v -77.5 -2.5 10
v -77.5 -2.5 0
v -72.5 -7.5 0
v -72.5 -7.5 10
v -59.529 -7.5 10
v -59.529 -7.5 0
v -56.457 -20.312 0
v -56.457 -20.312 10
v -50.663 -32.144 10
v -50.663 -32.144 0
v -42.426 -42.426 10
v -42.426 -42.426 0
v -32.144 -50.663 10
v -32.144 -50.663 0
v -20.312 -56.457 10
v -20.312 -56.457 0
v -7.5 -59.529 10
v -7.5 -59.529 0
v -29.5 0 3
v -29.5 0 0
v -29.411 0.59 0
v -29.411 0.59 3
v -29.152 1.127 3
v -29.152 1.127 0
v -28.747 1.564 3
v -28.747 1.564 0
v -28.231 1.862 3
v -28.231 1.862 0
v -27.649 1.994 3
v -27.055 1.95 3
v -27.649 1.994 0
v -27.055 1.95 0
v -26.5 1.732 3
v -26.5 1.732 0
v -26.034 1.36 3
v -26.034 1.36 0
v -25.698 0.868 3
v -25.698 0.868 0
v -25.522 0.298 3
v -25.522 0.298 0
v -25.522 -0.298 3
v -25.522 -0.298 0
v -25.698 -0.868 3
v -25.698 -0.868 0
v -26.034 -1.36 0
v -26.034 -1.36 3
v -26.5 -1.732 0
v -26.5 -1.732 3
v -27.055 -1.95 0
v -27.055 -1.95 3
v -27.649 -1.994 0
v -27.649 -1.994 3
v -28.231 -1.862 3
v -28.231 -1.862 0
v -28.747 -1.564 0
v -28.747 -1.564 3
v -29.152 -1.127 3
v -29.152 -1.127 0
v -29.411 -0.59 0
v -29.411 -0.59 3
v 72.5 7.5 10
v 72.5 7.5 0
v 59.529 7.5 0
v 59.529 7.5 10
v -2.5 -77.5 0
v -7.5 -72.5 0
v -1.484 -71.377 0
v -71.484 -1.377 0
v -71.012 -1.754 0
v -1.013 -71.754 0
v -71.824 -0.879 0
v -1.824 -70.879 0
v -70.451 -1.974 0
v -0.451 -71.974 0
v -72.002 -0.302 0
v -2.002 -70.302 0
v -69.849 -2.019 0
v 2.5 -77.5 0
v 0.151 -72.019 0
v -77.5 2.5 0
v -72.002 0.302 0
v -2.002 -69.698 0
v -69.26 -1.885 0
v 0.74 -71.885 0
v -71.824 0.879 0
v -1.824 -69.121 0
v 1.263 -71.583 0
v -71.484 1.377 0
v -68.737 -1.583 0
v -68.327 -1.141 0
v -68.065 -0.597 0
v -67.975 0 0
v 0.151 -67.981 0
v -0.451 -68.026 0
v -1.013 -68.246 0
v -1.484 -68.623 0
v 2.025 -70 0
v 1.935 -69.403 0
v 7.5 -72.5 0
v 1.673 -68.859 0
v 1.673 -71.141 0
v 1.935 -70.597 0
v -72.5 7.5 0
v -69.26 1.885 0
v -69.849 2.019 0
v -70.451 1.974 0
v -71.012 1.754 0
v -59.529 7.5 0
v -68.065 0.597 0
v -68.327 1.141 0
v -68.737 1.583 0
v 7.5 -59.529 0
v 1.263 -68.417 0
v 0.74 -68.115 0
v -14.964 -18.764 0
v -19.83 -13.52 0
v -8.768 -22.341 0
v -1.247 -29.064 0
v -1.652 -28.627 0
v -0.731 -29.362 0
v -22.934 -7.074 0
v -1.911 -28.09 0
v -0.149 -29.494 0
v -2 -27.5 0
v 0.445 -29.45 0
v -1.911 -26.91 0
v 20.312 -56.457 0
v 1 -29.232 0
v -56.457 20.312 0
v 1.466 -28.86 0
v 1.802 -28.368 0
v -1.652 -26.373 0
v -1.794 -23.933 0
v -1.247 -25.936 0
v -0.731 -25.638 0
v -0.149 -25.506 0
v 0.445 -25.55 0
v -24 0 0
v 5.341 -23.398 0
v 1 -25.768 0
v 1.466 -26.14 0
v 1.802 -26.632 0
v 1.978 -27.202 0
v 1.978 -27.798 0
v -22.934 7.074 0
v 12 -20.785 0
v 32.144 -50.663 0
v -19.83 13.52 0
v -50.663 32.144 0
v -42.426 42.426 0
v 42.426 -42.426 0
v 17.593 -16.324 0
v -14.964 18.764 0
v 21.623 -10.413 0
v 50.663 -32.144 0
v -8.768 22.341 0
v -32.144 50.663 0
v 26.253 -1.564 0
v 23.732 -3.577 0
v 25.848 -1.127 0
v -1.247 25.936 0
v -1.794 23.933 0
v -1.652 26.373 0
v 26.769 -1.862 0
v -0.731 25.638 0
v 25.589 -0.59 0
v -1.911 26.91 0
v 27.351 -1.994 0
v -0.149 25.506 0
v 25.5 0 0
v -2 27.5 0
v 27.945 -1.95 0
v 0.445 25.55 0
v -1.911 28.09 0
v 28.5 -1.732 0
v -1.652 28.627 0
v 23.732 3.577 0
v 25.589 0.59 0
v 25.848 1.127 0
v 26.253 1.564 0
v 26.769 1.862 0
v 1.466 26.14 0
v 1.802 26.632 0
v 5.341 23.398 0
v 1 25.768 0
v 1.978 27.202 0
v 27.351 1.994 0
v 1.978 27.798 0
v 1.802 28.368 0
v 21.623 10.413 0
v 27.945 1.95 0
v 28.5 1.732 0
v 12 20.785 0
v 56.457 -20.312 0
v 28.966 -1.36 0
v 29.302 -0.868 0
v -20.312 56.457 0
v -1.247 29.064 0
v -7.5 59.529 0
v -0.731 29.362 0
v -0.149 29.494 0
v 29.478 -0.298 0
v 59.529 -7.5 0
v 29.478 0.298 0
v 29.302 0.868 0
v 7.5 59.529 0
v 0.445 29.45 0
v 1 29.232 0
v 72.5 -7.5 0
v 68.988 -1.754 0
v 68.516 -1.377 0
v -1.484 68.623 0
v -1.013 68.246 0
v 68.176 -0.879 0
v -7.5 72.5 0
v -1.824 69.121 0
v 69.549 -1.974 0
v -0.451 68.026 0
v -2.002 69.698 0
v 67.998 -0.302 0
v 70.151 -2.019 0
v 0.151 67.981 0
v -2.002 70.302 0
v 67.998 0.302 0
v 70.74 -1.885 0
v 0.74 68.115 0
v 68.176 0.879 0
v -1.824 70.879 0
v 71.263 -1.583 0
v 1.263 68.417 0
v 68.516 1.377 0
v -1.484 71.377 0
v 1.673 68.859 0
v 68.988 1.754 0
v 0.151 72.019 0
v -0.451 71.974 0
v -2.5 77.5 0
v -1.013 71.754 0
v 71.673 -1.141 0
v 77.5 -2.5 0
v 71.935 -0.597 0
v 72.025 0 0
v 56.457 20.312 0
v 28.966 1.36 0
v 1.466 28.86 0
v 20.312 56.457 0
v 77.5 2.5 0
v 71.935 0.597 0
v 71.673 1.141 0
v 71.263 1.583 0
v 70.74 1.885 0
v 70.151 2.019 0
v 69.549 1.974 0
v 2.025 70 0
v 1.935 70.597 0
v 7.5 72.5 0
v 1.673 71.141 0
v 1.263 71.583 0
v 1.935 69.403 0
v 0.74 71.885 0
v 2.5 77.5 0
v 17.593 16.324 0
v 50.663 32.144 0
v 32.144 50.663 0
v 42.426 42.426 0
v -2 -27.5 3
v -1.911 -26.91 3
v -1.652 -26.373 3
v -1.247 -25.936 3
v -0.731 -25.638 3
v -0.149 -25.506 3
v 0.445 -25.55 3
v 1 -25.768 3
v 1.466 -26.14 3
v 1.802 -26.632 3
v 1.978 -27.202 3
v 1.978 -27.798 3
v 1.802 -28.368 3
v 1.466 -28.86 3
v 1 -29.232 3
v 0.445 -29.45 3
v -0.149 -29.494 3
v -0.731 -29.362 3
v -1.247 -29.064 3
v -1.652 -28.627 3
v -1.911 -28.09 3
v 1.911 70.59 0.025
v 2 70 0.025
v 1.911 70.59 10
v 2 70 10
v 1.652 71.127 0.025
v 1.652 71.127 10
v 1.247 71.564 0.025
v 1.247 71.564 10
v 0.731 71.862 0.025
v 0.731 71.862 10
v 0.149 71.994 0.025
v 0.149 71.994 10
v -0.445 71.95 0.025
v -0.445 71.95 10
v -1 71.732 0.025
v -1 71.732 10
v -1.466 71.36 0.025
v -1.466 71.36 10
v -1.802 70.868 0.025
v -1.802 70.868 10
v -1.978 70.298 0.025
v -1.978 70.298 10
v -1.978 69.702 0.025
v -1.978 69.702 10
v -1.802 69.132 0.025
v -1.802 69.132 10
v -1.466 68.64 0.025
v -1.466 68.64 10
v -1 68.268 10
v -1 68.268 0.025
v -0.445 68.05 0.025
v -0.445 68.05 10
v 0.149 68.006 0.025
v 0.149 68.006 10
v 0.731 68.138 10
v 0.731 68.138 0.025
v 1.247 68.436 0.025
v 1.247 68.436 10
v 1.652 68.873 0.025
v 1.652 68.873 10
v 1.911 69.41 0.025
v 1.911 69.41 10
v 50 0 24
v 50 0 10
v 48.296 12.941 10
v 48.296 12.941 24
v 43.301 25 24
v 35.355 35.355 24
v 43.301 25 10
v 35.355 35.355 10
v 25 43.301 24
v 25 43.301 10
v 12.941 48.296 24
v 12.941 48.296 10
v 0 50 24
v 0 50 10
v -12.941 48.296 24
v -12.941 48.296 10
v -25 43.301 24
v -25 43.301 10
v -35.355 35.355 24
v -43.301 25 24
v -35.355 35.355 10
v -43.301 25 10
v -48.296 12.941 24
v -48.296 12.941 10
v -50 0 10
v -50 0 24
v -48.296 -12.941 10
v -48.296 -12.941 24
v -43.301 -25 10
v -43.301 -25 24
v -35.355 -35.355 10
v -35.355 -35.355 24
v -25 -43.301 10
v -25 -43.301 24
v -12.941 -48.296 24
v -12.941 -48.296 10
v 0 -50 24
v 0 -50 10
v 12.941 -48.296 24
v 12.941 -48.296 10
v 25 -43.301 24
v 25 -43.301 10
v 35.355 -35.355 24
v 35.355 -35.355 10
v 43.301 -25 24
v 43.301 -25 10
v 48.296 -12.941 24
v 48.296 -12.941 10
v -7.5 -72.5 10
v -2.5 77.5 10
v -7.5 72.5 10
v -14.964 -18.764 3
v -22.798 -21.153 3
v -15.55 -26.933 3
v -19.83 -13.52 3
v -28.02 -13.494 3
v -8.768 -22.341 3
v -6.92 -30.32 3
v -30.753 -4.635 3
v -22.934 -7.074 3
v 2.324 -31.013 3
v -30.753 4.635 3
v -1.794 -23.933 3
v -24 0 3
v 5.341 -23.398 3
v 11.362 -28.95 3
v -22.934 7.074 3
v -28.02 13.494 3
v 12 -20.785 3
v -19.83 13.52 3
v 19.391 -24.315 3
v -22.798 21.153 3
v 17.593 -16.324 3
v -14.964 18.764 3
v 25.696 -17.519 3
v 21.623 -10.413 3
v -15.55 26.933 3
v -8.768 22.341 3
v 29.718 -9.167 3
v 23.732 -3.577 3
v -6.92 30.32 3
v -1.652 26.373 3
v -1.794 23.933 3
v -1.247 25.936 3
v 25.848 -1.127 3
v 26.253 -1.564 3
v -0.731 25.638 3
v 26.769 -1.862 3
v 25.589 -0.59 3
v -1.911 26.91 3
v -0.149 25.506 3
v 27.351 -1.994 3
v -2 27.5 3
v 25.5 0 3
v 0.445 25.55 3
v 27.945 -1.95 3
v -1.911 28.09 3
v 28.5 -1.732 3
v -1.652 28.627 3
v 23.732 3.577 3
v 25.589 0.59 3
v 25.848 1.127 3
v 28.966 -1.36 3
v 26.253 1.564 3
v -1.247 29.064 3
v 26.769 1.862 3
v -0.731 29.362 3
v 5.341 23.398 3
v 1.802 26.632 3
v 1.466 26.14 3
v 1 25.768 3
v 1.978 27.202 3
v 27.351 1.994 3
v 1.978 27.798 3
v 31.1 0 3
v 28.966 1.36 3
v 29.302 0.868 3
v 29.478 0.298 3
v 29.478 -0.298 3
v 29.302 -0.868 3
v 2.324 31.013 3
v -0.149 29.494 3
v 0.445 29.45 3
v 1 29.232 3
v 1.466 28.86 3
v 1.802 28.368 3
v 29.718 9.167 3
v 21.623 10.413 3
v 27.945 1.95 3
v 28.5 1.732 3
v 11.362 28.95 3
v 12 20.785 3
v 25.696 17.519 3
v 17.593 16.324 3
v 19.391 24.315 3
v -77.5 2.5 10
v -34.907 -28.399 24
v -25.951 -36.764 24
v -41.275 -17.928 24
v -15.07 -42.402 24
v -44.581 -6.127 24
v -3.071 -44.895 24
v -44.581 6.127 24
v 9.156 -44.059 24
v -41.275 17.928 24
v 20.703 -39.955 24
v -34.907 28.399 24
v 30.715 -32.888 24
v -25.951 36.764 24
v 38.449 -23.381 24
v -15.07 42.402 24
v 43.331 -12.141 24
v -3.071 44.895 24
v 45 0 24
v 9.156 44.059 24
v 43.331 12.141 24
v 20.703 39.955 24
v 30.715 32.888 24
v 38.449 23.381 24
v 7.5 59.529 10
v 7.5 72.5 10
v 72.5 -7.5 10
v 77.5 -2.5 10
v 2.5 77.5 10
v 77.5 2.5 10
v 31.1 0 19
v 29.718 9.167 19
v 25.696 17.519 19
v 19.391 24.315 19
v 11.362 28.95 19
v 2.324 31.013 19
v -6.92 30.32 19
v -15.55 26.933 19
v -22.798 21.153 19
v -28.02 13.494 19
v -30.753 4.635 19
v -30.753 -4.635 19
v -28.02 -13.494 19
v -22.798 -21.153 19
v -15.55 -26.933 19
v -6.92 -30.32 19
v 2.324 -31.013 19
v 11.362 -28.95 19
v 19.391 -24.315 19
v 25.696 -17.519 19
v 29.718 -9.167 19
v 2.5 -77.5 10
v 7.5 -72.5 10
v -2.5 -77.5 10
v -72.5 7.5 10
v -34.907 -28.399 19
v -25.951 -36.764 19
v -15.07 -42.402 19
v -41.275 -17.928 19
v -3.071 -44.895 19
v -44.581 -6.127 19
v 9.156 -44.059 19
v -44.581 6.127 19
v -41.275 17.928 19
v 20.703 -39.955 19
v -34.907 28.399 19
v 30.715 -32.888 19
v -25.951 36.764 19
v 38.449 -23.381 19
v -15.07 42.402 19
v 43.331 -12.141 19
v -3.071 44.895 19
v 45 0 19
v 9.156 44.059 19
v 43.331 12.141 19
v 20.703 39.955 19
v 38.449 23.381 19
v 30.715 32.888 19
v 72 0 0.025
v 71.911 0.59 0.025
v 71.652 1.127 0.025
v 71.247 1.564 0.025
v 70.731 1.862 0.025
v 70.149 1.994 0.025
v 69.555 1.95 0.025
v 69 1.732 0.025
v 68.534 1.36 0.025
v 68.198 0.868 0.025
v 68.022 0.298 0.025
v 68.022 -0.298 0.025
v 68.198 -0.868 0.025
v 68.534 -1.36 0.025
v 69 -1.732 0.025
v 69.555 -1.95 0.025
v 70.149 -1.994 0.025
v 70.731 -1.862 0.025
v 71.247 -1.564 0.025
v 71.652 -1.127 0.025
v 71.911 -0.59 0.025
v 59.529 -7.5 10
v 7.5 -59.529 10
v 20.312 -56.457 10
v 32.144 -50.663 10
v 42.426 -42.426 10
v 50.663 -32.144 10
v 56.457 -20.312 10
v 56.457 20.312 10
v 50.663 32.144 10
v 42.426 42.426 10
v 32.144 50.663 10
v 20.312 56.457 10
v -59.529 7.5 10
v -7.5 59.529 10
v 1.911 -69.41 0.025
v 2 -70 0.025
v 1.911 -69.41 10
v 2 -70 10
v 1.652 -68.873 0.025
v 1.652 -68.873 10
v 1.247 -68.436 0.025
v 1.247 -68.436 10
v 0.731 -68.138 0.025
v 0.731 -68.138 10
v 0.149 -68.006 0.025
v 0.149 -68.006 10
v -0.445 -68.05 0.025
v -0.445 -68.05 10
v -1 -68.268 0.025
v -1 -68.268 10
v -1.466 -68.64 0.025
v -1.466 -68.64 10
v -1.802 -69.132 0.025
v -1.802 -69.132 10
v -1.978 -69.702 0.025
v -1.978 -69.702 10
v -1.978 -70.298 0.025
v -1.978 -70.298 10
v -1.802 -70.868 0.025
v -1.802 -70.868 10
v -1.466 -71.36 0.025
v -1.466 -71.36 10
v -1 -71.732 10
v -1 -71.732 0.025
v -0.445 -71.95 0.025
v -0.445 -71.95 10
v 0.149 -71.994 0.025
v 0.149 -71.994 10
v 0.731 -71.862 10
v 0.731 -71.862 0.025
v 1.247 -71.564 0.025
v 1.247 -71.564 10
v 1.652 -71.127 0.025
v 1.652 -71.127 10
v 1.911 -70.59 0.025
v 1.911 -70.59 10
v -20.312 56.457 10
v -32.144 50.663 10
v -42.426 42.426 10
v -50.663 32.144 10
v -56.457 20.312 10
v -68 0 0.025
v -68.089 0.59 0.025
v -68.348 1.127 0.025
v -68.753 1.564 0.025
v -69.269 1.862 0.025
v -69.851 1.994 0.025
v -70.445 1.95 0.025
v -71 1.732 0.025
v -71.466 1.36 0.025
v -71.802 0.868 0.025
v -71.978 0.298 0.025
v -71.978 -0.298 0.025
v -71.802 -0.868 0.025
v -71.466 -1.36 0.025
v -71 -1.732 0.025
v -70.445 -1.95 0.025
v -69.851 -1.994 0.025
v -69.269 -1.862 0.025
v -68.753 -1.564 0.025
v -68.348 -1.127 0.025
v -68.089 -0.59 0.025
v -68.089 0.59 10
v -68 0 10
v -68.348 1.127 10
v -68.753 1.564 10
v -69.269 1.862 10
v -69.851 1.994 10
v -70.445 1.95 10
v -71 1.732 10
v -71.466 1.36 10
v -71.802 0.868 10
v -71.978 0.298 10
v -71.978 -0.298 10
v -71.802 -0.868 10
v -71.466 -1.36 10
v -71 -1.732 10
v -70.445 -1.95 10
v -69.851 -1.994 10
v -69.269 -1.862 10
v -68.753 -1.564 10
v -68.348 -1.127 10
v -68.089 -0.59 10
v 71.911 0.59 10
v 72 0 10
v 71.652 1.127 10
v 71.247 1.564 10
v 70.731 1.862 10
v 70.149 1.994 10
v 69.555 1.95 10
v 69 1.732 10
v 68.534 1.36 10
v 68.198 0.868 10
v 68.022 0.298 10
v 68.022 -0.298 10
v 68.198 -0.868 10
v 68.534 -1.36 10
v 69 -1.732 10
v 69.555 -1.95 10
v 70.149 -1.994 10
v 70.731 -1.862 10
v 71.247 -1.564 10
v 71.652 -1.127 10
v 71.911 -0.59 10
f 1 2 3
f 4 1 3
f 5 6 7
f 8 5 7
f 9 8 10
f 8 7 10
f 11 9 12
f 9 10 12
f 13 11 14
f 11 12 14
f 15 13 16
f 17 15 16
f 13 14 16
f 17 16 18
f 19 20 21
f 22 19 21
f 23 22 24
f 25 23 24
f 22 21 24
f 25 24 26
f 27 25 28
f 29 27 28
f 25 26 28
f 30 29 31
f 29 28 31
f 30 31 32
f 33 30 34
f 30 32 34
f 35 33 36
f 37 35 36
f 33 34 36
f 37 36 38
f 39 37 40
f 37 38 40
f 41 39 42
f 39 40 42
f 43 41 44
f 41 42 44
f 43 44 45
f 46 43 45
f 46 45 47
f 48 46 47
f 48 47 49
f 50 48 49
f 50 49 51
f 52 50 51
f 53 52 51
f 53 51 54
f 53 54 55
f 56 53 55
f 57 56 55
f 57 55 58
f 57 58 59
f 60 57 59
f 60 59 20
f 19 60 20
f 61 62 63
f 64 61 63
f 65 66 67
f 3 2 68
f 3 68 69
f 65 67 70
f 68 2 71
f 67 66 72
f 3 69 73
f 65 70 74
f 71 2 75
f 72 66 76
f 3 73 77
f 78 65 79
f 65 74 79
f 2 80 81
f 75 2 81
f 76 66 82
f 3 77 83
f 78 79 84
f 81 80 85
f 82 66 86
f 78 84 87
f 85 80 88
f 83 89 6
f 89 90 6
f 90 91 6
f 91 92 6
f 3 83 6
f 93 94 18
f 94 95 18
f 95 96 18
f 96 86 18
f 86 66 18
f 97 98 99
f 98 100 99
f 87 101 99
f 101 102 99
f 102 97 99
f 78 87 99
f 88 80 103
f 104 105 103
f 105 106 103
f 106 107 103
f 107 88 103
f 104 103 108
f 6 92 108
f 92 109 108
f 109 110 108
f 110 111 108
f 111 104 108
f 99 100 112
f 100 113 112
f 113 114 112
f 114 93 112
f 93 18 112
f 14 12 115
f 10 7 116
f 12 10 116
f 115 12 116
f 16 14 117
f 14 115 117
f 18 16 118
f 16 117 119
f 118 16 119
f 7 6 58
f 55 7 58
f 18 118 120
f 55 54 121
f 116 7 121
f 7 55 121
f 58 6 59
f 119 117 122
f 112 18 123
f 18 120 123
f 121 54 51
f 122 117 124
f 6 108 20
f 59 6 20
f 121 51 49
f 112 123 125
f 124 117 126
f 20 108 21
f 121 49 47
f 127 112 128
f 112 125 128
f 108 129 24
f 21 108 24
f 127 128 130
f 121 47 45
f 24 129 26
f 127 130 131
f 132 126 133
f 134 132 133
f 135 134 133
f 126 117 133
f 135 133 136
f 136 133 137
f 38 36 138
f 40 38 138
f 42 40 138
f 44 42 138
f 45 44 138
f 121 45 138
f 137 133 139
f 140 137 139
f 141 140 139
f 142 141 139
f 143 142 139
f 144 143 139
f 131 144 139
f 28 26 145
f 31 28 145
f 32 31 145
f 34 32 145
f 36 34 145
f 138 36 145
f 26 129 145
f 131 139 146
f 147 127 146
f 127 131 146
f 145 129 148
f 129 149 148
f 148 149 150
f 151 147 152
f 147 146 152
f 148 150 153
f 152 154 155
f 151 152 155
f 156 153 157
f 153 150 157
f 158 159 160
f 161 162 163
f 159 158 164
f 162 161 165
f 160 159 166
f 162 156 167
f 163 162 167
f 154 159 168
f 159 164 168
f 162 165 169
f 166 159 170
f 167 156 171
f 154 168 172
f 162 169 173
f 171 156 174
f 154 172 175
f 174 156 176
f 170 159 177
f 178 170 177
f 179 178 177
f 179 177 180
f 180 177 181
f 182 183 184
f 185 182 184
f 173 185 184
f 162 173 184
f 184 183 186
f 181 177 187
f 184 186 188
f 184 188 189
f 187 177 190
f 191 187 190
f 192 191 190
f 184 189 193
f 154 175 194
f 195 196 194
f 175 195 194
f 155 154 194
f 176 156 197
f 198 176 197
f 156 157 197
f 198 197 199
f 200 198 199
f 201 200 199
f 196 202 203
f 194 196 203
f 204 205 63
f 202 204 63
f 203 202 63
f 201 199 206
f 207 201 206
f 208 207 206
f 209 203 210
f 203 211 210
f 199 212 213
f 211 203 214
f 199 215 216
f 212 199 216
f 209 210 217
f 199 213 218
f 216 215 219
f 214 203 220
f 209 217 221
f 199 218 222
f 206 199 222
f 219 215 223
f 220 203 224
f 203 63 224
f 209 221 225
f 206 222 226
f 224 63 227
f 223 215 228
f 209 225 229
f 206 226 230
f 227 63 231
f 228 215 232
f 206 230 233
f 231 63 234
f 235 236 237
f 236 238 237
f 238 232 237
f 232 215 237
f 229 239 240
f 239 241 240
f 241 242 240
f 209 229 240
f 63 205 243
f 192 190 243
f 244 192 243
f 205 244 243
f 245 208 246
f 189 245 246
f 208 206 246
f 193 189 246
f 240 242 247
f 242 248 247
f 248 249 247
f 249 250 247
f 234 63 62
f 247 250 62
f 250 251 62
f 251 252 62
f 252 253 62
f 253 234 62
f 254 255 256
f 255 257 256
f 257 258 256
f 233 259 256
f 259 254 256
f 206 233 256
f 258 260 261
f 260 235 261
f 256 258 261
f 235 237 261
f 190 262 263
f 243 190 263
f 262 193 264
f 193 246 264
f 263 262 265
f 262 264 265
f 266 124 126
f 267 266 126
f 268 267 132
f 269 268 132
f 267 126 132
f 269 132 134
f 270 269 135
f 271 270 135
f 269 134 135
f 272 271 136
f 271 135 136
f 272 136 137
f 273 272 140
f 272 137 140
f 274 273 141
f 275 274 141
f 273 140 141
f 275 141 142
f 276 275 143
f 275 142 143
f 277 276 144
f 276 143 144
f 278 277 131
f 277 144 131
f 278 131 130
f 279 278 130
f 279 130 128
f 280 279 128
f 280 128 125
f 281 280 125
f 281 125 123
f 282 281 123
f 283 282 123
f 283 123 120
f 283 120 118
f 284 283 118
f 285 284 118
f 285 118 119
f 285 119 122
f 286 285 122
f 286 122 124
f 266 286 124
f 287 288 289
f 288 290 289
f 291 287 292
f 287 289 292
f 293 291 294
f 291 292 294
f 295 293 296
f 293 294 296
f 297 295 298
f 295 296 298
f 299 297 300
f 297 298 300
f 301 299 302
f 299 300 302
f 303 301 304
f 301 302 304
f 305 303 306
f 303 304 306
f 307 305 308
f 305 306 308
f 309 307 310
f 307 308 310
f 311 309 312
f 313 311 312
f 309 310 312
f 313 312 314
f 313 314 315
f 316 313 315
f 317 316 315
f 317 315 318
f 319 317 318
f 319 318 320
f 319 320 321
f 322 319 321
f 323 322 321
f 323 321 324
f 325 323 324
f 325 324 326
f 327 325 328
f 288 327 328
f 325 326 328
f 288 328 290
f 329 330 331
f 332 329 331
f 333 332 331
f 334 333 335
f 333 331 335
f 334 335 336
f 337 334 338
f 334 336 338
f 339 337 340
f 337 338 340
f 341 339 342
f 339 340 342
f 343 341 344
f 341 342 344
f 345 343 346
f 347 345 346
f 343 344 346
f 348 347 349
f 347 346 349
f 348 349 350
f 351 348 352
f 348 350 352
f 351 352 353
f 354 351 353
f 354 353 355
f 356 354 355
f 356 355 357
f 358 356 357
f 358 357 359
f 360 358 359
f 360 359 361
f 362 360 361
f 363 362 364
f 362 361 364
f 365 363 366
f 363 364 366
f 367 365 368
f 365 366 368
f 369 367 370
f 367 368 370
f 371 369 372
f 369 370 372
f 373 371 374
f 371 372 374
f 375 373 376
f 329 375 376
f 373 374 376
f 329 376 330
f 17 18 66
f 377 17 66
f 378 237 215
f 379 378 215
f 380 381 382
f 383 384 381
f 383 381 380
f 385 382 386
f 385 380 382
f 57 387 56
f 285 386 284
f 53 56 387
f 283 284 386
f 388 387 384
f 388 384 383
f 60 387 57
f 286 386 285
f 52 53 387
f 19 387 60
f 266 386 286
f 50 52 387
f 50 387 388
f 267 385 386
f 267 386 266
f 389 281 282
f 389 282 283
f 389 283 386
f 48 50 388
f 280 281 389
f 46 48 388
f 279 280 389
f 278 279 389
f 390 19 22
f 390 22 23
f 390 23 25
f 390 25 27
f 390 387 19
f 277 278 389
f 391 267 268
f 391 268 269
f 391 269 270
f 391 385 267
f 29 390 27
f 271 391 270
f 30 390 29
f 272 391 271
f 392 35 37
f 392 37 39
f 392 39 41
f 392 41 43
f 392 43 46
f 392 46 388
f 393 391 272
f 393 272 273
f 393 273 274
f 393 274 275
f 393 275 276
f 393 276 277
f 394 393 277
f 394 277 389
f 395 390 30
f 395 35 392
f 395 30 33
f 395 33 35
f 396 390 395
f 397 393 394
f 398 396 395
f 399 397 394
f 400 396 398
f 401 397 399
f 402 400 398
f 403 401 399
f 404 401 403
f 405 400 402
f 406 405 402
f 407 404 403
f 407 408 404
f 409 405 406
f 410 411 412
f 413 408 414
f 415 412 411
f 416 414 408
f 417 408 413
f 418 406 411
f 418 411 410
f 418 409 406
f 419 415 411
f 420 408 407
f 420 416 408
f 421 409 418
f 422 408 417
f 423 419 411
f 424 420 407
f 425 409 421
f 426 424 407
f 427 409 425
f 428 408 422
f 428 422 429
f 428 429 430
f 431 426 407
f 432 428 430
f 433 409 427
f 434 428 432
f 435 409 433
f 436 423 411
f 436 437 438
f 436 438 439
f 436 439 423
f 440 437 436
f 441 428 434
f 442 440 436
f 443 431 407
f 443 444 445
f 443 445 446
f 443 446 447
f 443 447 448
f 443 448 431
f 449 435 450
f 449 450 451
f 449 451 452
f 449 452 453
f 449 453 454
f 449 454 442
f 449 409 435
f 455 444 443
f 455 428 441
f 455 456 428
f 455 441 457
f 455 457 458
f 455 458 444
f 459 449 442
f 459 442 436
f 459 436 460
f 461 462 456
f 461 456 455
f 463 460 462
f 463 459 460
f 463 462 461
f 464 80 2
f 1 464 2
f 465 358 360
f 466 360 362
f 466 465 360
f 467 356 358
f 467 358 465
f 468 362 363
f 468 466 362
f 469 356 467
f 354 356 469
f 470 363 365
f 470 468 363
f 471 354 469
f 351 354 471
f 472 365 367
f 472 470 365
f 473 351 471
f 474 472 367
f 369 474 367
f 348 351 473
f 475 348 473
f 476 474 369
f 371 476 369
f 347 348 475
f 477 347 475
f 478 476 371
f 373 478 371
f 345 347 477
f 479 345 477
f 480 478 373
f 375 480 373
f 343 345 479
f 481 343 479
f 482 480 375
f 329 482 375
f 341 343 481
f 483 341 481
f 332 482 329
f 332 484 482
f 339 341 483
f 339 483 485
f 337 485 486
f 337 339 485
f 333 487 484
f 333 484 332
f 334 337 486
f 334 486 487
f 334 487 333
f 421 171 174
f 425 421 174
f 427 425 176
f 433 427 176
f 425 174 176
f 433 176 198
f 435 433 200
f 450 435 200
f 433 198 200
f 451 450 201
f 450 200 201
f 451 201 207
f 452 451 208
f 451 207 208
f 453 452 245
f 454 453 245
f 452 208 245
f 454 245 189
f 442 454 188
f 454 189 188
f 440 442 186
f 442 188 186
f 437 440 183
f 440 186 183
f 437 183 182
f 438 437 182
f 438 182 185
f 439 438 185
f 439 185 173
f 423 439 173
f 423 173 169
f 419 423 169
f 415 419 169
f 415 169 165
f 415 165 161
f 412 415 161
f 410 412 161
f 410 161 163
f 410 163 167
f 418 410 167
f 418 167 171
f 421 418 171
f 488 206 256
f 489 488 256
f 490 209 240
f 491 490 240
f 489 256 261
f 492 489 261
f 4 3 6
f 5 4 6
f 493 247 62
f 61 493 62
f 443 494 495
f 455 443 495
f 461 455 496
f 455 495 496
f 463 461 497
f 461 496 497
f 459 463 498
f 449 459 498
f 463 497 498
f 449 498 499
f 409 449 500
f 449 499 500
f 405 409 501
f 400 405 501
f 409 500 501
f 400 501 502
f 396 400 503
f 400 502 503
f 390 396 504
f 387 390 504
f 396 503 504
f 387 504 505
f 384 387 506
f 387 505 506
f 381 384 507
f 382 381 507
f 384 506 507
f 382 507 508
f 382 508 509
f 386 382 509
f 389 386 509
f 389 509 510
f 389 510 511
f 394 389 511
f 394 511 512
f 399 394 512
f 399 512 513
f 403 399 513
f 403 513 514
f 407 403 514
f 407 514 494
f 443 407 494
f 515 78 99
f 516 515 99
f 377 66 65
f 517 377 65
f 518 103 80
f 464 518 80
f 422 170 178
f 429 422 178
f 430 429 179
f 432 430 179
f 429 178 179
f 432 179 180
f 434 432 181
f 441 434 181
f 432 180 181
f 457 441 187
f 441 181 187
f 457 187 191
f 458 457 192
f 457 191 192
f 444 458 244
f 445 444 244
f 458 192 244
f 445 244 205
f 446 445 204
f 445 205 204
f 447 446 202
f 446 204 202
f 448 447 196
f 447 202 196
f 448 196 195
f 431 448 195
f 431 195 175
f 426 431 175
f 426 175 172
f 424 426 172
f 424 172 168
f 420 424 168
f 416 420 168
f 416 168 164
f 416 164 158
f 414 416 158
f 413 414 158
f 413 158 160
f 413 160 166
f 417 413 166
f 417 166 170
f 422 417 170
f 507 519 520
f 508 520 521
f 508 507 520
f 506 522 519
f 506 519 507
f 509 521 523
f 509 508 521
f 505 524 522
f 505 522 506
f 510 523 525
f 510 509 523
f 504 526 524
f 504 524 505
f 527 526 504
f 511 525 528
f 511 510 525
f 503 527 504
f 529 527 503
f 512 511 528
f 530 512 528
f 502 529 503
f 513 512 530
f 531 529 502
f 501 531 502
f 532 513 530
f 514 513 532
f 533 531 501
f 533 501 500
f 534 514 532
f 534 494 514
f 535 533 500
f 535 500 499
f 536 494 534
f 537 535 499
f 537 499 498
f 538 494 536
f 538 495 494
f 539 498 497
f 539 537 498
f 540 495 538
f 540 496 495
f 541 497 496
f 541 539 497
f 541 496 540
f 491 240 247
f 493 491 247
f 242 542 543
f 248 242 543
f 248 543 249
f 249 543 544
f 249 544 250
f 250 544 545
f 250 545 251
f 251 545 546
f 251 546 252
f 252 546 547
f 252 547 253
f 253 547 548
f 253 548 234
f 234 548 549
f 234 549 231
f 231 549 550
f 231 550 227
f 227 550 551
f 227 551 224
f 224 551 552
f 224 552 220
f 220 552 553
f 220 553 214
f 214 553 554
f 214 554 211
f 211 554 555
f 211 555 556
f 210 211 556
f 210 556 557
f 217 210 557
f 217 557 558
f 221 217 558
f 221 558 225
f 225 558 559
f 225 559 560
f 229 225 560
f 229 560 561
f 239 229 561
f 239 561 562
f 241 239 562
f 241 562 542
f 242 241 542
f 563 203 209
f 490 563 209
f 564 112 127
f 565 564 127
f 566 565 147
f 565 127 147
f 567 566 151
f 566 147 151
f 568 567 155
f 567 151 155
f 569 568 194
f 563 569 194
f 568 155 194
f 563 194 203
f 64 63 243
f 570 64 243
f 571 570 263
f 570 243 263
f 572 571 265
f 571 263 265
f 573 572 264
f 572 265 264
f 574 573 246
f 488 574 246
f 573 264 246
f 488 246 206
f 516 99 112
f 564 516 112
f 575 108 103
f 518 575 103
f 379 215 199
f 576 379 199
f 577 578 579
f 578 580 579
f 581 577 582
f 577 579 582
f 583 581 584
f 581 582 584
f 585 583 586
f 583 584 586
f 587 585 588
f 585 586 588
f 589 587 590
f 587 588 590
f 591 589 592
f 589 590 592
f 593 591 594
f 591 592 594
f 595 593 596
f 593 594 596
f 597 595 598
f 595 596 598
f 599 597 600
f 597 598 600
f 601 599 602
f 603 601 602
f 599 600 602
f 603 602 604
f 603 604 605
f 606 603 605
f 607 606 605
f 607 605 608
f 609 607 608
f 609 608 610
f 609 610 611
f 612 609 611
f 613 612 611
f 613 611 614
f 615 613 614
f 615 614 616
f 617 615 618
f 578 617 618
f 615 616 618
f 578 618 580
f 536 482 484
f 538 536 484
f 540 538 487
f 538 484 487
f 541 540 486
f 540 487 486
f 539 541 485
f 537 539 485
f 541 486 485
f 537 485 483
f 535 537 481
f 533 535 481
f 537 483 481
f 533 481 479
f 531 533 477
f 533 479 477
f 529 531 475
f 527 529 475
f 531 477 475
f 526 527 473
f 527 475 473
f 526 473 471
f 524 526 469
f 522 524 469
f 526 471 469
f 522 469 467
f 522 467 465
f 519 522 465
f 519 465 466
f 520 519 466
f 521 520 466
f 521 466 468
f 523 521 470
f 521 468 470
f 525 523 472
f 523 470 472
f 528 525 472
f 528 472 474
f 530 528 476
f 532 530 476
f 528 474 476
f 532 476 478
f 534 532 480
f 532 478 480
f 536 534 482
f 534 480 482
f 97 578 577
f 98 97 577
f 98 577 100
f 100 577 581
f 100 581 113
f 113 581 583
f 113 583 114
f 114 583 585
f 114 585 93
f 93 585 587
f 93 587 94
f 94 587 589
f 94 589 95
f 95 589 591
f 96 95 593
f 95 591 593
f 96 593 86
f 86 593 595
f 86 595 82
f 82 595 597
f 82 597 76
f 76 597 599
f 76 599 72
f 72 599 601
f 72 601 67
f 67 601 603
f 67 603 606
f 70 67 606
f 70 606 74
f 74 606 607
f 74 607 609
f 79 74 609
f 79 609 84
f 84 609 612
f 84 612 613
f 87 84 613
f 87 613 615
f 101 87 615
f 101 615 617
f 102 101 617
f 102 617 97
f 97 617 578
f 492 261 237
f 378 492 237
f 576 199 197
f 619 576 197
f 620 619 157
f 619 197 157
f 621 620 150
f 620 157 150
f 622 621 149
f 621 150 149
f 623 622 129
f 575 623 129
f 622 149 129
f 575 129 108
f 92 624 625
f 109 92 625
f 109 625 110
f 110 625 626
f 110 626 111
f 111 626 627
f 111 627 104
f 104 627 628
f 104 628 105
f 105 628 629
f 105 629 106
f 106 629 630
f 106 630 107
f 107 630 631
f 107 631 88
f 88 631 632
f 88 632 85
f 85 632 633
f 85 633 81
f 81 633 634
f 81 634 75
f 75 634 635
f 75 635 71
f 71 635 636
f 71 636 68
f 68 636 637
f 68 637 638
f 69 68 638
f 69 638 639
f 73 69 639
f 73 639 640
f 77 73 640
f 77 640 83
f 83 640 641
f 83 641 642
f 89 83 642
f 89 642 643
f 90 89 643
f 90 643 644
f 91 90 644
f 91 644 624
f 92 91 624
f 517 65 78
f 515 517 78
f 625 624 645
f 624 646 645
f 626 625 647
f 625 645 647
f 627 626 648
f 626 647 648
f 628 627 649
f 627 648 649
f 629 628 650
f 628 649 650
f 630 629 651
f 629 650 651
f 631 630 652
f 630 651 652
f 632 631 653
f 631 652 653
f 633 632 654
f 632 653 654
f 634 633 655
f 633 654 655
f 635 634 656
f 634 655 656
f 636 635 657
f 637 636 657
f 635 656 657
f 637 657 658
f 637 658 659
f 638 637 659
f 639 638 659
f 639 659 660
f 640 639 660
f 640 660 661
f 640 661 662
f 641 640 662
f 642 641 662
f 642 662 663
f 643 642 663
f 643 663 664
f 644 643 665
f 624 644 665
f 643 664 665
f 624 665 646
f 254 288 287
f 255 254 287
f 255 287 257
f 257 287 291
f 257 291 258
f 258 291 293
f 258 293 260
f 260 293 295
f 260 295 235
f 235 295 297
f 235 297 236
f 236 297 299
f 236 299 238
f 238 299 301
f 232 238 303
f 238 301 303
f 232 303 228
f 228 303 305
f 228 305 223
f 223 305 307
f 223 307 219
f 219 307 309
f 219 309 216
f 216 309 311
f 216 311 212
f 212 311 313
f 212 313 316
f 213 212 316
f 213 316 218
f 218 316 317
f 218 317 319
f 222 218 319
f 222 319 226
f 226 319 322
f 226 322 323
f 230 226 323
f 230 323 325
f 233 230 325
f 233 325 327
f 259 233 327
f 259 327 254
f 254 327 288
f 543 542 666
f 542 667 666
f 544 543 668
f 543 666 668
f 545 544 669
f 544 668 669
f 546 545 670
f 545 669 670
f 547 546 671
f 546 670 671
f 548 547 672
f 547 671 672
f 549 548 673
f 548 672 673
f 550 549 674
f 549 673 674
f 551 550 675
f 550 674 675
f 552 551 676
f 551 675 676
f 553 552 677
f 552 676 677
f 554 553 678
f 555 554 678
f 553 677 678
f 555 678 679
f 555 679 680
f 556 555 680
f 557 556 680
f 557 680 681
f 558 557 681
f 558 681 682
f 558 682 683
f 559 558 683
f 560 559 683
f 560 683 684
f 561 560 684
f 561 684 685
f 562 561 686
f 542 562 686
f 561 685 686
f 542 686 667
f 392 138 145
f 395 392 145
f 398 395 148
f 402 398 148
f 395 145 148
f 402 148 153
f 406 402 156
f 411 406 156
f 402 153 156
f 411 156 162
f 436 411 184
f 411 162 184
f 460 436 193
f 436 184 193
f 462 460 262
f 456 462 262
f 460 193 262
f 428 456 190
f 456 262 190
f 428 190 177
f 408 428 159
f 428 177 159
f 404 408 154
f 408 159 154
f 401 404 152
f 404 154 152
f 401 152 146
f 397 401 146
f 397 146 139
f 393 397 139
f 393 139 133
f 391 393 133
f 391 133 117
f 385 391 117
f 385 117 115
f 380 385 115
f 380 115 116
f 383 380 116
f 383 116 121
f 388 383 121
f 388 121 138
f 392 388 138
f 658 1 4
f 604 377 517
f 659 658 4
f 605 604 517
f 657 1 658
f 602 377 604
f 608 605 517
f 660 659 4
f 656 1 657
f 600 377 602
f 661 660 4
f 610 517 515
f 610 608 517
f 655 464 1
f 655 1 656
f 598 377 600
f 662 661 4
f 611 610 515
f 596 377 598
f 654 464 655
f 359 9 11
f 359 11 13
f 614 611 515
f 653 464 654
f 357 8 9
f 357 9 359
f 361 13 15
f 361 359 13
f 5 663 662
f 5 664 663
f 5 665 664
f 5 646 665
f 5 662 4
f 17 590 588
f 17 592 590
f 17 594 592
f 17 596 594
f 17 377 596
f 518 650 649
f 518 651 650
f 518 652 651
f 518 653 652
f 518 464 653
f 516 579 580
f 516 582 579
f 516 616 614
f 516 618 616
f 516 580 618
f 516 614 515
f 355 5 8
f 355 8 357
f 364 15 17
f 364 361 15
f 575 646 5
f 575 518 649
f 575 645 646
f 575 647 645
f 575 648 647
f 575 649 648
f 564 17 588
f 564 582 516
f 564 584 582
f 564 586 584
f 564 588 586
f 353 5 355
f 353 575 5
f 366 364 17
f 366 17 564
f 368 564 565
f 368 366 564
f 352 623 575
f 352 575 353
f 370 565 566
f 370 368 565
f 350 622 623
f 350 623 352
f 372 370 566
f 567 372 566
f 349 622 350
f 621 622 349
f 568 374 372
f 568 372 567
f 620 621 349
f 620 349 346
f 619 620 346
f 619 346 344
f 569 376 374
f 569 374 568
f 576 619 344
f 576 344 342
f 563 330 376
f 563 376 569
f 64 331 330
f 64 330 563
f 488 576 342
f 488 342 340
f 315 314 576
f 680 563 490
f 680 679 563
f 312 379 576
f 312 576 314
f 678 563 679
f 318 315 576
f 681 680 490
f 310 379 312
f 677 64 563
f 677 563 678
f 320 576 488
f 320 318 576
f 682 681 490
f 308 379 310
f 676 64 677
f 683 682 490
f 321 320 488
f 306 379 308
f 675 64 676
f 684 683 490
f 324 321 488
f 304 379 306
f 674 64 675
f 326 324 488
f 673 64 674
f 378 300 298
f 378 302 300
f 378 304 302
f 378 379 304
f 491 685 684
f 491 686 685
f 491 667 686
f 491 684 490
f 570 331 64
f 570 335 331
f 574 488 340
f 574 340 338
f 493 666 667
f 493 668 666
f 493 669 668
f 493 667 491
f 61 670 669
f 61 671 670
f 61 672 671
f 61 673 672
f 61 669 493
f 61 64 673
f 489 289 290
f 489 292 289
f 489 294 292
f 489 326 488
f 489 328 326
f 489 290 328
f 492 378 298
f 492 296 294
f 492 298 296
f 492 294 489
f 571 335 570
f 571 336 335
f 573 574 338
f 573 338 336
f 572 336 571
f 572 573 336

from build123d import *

# Parameters (mm, degrees)
BOSS_EXTRUDE1_DEPTH             = 10
SKETCH2_R                       = 50
BOSS_EXTRUDE2_DEPTH             = 14
SKETCH3_R                       = 31.1
CUT_EXTRUDE1_DEPTH              = 21
F_4_0MM_DOWEL_HOLE1_D           = 4
F_4_0MM_DOWEL_HOLE1_CSINK_D     = 4.05
F_4_0MM_DOWEL_HOLE1_CSINK_ANGLE = 90
SKETCH11_R                      = 45
CUT_EXTRUDE2_DEPTH              = 5
SKETCH4_R                       = 24
CUT_EXTRUDE3_DEPTH              = 4
SKETCH12_R                      = 2
CUT_EXTRUDE5_DEPTH              = 4


with BuildPart() as part:
    # Sketch1 → Boss-Extrude1 (new body)
    with BuildSketch(Plane.XY):
        with BuildLine():
            Line((-42.5, 7.5), (-59.529404499, 7.5))
            ThreePointArc((-59.529404499, 7.5), (-60, 0), (-59.529404499, -7.5))
            Line((-59.529404499, -7.5), (-42.5, -7.5))
            Line((-42.5, -7.5), (-42.5, 7.5))
        make_face()
        with BuildLine():
            ThreePointArc((-7.5, 59.529404499), (-42.426406871, 42.426406871), (-59.529404499, 7.5))
            Line((-59.529404499, 7.5), (-42.5, 7.5))
            Line((-42.5, 7.5), (-42.5, -7.5))
            Line((-42.5, -7.5), (-59.529404499, -7.5))
            ThreePointArc((-59.529404499, -7.5), (-42.426406871, -42.426406871), (-7.5, -59.529404499))
            Line((-7.5, -59.529404499), (-7.5, -42.5))
            Line((-7.5, -42.5), (7.5, -42.5))
            Line((7.5, -42.5), (7.5, -59.529404499))
            ThreePointArc((7.5, -59.529404499), (42.426406871, -42.426406871), (59.529404499, -7.5))
            Line((59.529404499, -7.5), (42.5, -7.5))
            Line((42.5, -7.5), (42.5, 7.5))
            Line((42.5, 7.5), (59.529404499, 7.5))
            ThreePointArc((59.529404499, 7.5), (42.426406871, 42.426406871), (7.5, 59.529404499))
            Line((7.5, 59.529404499), (7.5, 42.5))
            Line((7.5, 42.5), (-7.5, 42.5))
            Line((-7.5, 42.5), (-7.5, 59.529404499))
        make_face()
        with BuildLine():
            ThreePointArc((7.5, 59.529404499), (0, 60), (-7.5, 59.529404499))
            Line((-7.5, 59.529404499), (-7.5, 42.5))
            Line((-7.5, 42.5), (7.5, 42.5))
            Line((7.5, 42.5), (7.5, 59.529404499))
        make_face()
        with BuildLine():
            Line((-7.5, 72.5), (-7.5, 59.529404499))
            ThreePointArc((-7.5, 59.529404499), (0, 60), (7.5, 59.529404499))
            Line((7.5, 59.529404499), (7.5, 72.5))
            Line((7.5, 72.5), (2.5, 77.5))
            Line((2.5, 77.5), (-2.5, 77.5))
            Line((-2.5, 77.5), (-7.5, 72.5))
        make_face()
        with BuildLine():
            Line((-59.529404499, 7.5), (-72.5, 7.5))
            Line((-72.5, 7.5), (-77.5, 2.5))
            Line((-77.5, 2.5), (-77.5, -2.5))
            Line((-77.5, -2.5), (-72.5, -7.5))
            Line((-72.5, -7.5), (-59.529404499, -7.5))
            ThreePointArc((-59.529404499, -7.5), (-60, 0), (-59.529404499, 7.5))
        make_face()
        with BuildLine():
            ThreePointArc((60, 0), (59.882235554, 3.757374753), (59.529404499, 7.5))
            Line((59.529404499, 7.5), (42.5, 7.5))
            Line((42.5, 7.5), (42.5, -7.5))
            Line((42.5, -7.5), (59.529404499, -7.5))
            ThreePointArc((59.529404499, -7.5), (59.882235554, -3.757374753), (60, 0))
        make_face()
        with BuildLine():
            Line((72.5, 7.5), (59.529404499, 7.5))
            ThreePointArc((59.529404499, 7.5), (59.882235554, 3.757374753), (60, 0))
            ThreePointArc((60, 0), (59.882235554, -3.757374753), (59.529404499, -7.5))
            Line((59.529404499, -7.5), (72.5, -7.5))
            Line((72.5, -7.5), (77.5, -2.5))
            Line((77.5, -2.5), (77.5, 2.5))
            Line((77.5, 2.5), (72.5, 7.5))
        make_face()
        with BuildLine():
            ThreePointArc((7.5, -59.529404499), (0, -60), (-7.5, -59.529404499))
            Line((-7.5, -59.529404499), (-7.5, -72.5))
            Line((-7.5, -72.5), (-2.5, -77.5))
            Line((-2.5, -77.5), (2.5, -77.5))
            Line((2.5, -77.5), (7.5, -72.5))
            Line((7.5, -72.5), (7.5, -59.529404499))
        make_face()
        with BuildLine():
            Line((-7.5, -42.5), (-7.5, -59.529404499))
            ThreePointArc((-7.5, -59.529404499), (0, -60), (7.5, -59.529404499))
            Line((7.5, -59.529404499), (7.5, -42.5))
            Line((7.5, -42.5), (-7.5, -42.5))
        make_face()
    extrude(amount=BOSS_EXTRUDE1_DEPTH)

    # Sketch2 → Boss-Extrude2 (add)
    with BuildSketch(Plane.XY.offset(10)):
        Circle(SKETCH2_R)
    extrude(amount=BOSS_EXTRUDE2_DEPTH)

    # Sketch3 → Cut-Extrude1 (cut)
    with BuildSketch(Plane.XY.offset(24)):
        Circle(SKETCH3_R)
    extrude(amount=-CUT_EXTRUDE1_DEPTH, mode=Mode.SUBTRACT)

    # Ø4.0mm Dowel Hole1 (through all)
    with Locations(Plane(origin=(0, 0, 0), x_dir=(-1, 0, 0), z_dir=(0, 0, -1))):
        with Locations((-70, 0), (0, 70), (70, 0), (0, -70)):
            CounterSinkHole(F_4_0MM_DOWEL_HOLE1_D / 2, F_4_0MM_DOWEL_HOLE1_CSINK_D / 2, counter_sink_angle=F_4_0MM_DOWEL_HOLE1_CSINK_ANGLE)

    # Sketch11 → Cut-Extrude2 (cut)
    with BuildSketch(Plane.XY.offset(24)):
        Circle(SKETCH11_R)
    extrude(amount=-CUT_EXTRUDE2_DEPTH, mode=Mode.SUBTRACT)

    # Sketch4 → Cut-Extrude3 (cut)
    with BuildSketch(Plane(origin=(0, 0, 0), x_dir=(-1, 0, 0), z_dir=(0, 0, -1))):
        Circle(SKETCH4_R)
    extrude(amount=-CUT_EXTRUDE3_DEPTH, mode=Mode.SUBTRACT)

    # Sketch12 → Cut-Extrude5 (cut)
    with BuildSketch(Plane(origin=(0, 0, 0), x_dir=(-1, 0, 0), z_dir=(0, 0, -1))):
        with Locations((27.5, 0)):
            Circle(SKETCH12_R)
        with Locations((0, -27.5)):
            Circle(SKETCH12_R)
        with Locations((-27.5, 0)):
            Circle(SKETCH12_R)
        with Locations((0, 27.5)):
            Circle(SKETCH12_R)
    extrude(amount=-CUT_EXTRUDE5_DEPTH, mode=Mode.SUBTRACT)


solid = part.part
